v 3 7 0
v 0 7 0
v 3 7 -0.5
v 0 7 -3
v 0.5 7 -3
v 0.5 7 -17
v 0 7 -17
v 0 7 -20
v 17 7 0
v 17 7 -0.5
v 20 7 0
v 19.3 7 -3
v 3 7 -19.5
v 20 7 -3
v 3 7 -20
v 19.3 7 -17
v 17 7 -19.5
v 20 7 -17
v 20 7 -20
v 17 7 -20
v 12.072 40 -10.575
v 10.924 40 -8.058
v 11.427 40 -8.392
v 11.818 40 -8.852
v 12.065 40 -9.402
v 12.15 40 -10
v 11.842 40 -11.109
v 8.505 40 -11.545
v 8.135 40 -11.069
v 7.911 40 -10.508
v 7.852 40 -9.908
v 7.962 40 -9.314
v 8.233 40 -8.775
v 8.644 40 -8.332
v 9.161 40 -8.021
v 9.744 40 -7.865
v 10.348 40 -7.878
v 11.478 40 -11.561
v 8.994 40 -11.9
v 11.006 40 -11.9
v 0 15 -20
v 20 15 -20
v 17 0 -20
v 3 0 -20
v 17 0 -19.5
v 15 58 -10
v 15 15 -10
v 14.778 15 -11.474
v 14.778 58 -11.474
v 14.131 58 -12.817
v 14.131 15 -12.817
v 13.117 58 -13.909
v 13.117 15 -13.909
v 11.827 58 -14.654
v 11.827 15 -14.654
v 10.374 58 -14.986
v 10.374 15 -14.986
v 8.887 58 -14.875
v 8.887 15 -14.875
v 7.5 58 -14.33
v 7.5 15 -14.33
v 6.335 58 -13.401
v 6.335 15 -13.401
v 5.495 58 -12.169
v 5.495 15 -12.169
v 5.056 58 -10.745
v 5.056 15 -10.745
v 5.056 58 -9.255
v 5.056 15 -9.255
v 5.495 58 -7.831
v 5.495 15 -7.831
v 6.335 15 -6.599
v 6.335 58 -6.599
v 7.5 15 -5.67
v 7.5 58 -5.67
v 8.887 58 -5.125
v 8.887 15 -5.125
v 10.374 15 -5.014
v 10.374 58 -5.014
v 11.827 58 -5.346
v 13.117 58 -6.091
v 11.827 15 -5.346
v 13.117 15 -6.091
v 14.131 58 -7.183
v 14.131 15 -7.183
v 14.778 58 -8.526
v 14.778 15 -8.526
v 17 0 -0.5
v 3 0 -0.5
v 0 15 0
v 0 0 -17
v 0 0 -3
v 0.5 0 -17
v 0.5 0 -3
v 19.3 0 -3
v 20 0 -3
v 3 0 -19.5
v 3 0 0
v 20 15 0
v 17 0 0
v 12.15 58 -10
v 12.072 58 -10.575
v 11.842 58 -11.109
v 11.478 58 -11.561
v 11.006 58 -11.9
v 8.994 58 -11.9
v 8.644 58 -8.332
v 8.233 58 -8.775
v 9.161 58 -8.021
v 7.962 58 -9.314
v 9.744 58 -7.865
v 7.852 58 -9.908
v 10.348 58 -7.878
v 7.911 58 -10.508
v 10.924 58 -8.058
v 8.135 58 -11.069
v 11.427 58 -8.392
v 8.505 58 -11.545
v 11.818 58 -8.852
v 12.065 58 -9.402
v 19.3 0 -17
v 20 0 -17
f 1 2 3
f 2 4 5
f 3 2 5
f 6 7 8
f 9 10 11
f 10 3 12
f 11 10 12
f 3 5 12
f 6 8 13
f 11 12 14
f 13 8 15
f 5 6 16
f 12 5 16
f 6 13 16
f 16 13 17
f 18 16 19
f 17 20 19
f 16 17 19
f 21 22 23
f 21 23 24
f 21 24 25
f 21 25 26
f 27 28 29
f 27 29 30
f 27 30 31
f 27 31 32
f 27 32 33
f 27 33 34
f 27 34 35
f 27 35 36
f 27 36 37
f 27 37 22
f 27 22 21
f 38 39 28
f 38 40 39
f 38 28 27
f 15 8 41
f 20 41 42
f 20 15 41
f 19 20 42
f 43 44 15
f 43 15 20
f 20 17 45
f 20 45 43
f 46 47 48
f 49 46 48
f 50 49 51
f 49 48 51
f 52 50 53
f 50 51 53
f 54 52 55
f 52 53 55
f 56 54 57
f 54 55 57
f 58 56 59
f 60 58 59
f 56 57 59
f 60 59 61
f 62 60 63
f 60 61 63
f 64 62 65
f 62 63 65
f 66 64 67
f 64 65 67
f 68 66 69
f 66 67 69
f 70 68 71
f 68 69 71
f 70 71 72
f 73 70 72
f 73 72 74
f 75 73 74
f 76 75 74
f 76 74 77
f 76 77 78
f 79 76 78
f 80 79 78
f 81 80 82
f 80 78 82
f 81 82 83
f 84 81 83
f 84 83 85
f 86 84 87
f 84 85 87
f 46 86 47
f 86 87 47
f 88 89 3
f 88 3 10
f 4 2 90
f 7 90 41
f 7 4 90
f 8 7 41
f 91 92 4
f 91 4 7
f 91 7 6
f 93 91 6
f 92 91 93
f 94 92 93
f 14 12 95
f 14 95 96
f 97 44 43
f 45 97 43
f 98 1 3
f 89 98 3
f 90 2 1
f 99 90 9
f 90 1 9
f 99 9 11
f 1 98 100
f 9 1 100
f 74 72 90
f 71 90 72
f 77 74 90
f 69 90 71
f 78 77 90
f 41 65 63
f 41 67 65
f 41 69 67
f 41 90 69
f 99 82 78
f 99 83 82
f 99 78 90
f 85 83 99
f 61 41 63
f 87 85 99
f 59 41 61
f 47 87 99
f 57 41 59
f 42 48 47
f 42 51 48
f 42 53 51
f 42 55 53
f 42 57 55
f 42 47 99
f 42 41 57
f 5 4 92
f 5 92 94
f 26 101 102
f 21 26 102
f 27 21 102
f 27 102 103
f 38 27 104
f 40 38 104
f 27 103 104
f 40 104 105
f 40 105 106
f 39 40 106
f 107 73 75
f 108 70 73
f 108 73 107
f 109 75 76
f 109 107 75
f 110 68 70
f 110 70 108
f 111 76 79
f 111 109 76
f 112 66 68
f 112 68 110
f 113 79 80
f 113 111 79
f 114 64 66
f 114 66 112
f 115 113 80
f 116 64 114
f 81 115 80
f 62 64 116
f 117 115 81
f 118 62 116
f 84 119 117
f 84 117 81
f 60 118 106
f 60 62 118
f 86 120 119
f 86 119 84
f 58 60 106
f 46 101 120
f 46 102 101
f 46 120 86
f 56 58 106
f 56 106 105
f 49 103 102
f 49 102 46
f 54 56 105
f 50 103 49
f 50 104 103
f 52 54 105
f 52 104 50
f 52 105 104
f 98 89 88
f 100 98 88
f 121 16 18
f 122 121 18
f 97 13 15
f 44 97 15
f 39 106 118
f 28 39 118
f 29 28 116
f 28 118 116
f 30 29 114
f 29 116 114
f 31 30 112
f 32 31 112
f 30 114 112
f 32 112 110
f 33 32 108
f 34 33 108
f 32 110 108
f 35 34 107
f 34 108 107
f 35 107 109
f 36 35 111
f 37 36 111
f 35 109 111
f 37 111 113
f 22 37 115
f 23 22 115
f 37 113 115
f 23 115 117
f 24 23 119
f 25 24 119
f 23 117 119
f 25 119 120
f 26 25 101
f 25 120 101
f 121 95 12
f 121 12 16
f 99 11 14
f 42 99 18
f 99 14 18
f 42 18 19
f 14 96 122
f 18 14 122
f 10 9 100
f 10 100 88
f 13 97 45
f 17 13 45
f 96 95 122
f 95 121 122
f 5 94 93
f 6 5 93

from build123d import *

# Parameters (mm, degrees)
SKETCH_1_W          = 20
SKETCH_1_H          = 20
SKETCH_1_W_2        = 18.8
SKETCH_1_H_2        = 19
EXTRUDE_1_DEPTH     = 7
SKETCH_3_W          = 20
SKETCH_3_H          = 20
EXTRUDE_2_DEPTH     = 8
SKETCH_4_R          = 5
EXTRUDE_3_DEPTH     = 43
CUT_EXTRUDE_1_DEPTH = 18
SKETCH_6_W          = 3
SKETCH_6_H          = 3
CUT_EXTRUDE_2_DEPTH = 10


with BuildPart() as part:
    # 草圖1 → 填料-伸長1 (new body)
    with BuildSketch(Plane(origin=(0, 0, 0), x_dir=(1, 0, 0), z_dir=(0, 1, 0))):
        with Locations((10, 10)):
            Rectangle(SKETCH_1_W, SKETCH_1_H)
        with Locations((9.9, 10)):
            Rectangle(SKETCH_1_W_2, SKETCH_1_H_2, mode=Mode.SUBTRACT)
    extrude(amount=EXTRUDE_1_DEPTH)

    # 草圖3 → 填料-伸長2 (add)
    with BuildSketch(Plane(origin=(0, 7, 0), x_dir=(1, 0, 0), z_dir=(0, 1, 0))):
        with Locations((10, 10)):
            Rectangle(SKETCH_3_W, SKETCH_3_H)
    extrude(amount=EXTRUDE_2_DEPTH)

    # 草圖4 → 填料-伸長3 (add)
    with BuildSketch(Plane(origin=(0, 15, 0), x_dir=(1, 0, 0), z_dir=(0, 1, 0))):
        with Locations((10, 10)):
            Circle(SKETCH_4_R)
    extrude(amount=EXTRUDE_3_DEPTH)

    # 草圖5 → 除料-伸長1 (cut)
    with BuildSketch(Plane(origin=(0, 58, 0), x_dir=(1, 0, 0), z_dir=(0, 1, 0))):
        with BuildLine():
            Line((10, 11.9), (8.99376941, 11.9))
            ThreePointArc((8.99376941, 11.9), (8.891148289, 8.158004375), (12.15, 10))
            ThreePointArc((12.15, 10), (11.841995625, 11.108851711), (11.00623059, 11.9))
            Line((11.00623059, 11.9), (10, 11.9))
        make_face()
    extrude(amount=-CUT_EXTRUDE_1_DEPTH, mode=Mode.SUBTRACT)

    # 草圖6 → 除料-伸長2 (cut)
    with BuildSketch(Plane(origin=(0, 7, 0), x_dir=(1, 0, 0), z_dir=(0, 1, 0))):
        with Locations((1.5, 18.5)):
            Rectangle(SKETCH_6_W, SKETCH_6_H)
        with Locations((18.5, 18.5)):
            Rectangle(SKETCH_6_W, SKETCH_6_H)
        with Locations((18.5, 1.5)):
            Rectangle(SKETCH_6_W, SKETCH_6_H)
        with Locations((1.5, 1.5)):
            Rectangle(SKETCH_6_W, SKETCH_6_H)
    extrude(amount=-CUT_EXTRUDE_2_DEPTH, mode=Mode.SUBTRACT)


solid = part.part
